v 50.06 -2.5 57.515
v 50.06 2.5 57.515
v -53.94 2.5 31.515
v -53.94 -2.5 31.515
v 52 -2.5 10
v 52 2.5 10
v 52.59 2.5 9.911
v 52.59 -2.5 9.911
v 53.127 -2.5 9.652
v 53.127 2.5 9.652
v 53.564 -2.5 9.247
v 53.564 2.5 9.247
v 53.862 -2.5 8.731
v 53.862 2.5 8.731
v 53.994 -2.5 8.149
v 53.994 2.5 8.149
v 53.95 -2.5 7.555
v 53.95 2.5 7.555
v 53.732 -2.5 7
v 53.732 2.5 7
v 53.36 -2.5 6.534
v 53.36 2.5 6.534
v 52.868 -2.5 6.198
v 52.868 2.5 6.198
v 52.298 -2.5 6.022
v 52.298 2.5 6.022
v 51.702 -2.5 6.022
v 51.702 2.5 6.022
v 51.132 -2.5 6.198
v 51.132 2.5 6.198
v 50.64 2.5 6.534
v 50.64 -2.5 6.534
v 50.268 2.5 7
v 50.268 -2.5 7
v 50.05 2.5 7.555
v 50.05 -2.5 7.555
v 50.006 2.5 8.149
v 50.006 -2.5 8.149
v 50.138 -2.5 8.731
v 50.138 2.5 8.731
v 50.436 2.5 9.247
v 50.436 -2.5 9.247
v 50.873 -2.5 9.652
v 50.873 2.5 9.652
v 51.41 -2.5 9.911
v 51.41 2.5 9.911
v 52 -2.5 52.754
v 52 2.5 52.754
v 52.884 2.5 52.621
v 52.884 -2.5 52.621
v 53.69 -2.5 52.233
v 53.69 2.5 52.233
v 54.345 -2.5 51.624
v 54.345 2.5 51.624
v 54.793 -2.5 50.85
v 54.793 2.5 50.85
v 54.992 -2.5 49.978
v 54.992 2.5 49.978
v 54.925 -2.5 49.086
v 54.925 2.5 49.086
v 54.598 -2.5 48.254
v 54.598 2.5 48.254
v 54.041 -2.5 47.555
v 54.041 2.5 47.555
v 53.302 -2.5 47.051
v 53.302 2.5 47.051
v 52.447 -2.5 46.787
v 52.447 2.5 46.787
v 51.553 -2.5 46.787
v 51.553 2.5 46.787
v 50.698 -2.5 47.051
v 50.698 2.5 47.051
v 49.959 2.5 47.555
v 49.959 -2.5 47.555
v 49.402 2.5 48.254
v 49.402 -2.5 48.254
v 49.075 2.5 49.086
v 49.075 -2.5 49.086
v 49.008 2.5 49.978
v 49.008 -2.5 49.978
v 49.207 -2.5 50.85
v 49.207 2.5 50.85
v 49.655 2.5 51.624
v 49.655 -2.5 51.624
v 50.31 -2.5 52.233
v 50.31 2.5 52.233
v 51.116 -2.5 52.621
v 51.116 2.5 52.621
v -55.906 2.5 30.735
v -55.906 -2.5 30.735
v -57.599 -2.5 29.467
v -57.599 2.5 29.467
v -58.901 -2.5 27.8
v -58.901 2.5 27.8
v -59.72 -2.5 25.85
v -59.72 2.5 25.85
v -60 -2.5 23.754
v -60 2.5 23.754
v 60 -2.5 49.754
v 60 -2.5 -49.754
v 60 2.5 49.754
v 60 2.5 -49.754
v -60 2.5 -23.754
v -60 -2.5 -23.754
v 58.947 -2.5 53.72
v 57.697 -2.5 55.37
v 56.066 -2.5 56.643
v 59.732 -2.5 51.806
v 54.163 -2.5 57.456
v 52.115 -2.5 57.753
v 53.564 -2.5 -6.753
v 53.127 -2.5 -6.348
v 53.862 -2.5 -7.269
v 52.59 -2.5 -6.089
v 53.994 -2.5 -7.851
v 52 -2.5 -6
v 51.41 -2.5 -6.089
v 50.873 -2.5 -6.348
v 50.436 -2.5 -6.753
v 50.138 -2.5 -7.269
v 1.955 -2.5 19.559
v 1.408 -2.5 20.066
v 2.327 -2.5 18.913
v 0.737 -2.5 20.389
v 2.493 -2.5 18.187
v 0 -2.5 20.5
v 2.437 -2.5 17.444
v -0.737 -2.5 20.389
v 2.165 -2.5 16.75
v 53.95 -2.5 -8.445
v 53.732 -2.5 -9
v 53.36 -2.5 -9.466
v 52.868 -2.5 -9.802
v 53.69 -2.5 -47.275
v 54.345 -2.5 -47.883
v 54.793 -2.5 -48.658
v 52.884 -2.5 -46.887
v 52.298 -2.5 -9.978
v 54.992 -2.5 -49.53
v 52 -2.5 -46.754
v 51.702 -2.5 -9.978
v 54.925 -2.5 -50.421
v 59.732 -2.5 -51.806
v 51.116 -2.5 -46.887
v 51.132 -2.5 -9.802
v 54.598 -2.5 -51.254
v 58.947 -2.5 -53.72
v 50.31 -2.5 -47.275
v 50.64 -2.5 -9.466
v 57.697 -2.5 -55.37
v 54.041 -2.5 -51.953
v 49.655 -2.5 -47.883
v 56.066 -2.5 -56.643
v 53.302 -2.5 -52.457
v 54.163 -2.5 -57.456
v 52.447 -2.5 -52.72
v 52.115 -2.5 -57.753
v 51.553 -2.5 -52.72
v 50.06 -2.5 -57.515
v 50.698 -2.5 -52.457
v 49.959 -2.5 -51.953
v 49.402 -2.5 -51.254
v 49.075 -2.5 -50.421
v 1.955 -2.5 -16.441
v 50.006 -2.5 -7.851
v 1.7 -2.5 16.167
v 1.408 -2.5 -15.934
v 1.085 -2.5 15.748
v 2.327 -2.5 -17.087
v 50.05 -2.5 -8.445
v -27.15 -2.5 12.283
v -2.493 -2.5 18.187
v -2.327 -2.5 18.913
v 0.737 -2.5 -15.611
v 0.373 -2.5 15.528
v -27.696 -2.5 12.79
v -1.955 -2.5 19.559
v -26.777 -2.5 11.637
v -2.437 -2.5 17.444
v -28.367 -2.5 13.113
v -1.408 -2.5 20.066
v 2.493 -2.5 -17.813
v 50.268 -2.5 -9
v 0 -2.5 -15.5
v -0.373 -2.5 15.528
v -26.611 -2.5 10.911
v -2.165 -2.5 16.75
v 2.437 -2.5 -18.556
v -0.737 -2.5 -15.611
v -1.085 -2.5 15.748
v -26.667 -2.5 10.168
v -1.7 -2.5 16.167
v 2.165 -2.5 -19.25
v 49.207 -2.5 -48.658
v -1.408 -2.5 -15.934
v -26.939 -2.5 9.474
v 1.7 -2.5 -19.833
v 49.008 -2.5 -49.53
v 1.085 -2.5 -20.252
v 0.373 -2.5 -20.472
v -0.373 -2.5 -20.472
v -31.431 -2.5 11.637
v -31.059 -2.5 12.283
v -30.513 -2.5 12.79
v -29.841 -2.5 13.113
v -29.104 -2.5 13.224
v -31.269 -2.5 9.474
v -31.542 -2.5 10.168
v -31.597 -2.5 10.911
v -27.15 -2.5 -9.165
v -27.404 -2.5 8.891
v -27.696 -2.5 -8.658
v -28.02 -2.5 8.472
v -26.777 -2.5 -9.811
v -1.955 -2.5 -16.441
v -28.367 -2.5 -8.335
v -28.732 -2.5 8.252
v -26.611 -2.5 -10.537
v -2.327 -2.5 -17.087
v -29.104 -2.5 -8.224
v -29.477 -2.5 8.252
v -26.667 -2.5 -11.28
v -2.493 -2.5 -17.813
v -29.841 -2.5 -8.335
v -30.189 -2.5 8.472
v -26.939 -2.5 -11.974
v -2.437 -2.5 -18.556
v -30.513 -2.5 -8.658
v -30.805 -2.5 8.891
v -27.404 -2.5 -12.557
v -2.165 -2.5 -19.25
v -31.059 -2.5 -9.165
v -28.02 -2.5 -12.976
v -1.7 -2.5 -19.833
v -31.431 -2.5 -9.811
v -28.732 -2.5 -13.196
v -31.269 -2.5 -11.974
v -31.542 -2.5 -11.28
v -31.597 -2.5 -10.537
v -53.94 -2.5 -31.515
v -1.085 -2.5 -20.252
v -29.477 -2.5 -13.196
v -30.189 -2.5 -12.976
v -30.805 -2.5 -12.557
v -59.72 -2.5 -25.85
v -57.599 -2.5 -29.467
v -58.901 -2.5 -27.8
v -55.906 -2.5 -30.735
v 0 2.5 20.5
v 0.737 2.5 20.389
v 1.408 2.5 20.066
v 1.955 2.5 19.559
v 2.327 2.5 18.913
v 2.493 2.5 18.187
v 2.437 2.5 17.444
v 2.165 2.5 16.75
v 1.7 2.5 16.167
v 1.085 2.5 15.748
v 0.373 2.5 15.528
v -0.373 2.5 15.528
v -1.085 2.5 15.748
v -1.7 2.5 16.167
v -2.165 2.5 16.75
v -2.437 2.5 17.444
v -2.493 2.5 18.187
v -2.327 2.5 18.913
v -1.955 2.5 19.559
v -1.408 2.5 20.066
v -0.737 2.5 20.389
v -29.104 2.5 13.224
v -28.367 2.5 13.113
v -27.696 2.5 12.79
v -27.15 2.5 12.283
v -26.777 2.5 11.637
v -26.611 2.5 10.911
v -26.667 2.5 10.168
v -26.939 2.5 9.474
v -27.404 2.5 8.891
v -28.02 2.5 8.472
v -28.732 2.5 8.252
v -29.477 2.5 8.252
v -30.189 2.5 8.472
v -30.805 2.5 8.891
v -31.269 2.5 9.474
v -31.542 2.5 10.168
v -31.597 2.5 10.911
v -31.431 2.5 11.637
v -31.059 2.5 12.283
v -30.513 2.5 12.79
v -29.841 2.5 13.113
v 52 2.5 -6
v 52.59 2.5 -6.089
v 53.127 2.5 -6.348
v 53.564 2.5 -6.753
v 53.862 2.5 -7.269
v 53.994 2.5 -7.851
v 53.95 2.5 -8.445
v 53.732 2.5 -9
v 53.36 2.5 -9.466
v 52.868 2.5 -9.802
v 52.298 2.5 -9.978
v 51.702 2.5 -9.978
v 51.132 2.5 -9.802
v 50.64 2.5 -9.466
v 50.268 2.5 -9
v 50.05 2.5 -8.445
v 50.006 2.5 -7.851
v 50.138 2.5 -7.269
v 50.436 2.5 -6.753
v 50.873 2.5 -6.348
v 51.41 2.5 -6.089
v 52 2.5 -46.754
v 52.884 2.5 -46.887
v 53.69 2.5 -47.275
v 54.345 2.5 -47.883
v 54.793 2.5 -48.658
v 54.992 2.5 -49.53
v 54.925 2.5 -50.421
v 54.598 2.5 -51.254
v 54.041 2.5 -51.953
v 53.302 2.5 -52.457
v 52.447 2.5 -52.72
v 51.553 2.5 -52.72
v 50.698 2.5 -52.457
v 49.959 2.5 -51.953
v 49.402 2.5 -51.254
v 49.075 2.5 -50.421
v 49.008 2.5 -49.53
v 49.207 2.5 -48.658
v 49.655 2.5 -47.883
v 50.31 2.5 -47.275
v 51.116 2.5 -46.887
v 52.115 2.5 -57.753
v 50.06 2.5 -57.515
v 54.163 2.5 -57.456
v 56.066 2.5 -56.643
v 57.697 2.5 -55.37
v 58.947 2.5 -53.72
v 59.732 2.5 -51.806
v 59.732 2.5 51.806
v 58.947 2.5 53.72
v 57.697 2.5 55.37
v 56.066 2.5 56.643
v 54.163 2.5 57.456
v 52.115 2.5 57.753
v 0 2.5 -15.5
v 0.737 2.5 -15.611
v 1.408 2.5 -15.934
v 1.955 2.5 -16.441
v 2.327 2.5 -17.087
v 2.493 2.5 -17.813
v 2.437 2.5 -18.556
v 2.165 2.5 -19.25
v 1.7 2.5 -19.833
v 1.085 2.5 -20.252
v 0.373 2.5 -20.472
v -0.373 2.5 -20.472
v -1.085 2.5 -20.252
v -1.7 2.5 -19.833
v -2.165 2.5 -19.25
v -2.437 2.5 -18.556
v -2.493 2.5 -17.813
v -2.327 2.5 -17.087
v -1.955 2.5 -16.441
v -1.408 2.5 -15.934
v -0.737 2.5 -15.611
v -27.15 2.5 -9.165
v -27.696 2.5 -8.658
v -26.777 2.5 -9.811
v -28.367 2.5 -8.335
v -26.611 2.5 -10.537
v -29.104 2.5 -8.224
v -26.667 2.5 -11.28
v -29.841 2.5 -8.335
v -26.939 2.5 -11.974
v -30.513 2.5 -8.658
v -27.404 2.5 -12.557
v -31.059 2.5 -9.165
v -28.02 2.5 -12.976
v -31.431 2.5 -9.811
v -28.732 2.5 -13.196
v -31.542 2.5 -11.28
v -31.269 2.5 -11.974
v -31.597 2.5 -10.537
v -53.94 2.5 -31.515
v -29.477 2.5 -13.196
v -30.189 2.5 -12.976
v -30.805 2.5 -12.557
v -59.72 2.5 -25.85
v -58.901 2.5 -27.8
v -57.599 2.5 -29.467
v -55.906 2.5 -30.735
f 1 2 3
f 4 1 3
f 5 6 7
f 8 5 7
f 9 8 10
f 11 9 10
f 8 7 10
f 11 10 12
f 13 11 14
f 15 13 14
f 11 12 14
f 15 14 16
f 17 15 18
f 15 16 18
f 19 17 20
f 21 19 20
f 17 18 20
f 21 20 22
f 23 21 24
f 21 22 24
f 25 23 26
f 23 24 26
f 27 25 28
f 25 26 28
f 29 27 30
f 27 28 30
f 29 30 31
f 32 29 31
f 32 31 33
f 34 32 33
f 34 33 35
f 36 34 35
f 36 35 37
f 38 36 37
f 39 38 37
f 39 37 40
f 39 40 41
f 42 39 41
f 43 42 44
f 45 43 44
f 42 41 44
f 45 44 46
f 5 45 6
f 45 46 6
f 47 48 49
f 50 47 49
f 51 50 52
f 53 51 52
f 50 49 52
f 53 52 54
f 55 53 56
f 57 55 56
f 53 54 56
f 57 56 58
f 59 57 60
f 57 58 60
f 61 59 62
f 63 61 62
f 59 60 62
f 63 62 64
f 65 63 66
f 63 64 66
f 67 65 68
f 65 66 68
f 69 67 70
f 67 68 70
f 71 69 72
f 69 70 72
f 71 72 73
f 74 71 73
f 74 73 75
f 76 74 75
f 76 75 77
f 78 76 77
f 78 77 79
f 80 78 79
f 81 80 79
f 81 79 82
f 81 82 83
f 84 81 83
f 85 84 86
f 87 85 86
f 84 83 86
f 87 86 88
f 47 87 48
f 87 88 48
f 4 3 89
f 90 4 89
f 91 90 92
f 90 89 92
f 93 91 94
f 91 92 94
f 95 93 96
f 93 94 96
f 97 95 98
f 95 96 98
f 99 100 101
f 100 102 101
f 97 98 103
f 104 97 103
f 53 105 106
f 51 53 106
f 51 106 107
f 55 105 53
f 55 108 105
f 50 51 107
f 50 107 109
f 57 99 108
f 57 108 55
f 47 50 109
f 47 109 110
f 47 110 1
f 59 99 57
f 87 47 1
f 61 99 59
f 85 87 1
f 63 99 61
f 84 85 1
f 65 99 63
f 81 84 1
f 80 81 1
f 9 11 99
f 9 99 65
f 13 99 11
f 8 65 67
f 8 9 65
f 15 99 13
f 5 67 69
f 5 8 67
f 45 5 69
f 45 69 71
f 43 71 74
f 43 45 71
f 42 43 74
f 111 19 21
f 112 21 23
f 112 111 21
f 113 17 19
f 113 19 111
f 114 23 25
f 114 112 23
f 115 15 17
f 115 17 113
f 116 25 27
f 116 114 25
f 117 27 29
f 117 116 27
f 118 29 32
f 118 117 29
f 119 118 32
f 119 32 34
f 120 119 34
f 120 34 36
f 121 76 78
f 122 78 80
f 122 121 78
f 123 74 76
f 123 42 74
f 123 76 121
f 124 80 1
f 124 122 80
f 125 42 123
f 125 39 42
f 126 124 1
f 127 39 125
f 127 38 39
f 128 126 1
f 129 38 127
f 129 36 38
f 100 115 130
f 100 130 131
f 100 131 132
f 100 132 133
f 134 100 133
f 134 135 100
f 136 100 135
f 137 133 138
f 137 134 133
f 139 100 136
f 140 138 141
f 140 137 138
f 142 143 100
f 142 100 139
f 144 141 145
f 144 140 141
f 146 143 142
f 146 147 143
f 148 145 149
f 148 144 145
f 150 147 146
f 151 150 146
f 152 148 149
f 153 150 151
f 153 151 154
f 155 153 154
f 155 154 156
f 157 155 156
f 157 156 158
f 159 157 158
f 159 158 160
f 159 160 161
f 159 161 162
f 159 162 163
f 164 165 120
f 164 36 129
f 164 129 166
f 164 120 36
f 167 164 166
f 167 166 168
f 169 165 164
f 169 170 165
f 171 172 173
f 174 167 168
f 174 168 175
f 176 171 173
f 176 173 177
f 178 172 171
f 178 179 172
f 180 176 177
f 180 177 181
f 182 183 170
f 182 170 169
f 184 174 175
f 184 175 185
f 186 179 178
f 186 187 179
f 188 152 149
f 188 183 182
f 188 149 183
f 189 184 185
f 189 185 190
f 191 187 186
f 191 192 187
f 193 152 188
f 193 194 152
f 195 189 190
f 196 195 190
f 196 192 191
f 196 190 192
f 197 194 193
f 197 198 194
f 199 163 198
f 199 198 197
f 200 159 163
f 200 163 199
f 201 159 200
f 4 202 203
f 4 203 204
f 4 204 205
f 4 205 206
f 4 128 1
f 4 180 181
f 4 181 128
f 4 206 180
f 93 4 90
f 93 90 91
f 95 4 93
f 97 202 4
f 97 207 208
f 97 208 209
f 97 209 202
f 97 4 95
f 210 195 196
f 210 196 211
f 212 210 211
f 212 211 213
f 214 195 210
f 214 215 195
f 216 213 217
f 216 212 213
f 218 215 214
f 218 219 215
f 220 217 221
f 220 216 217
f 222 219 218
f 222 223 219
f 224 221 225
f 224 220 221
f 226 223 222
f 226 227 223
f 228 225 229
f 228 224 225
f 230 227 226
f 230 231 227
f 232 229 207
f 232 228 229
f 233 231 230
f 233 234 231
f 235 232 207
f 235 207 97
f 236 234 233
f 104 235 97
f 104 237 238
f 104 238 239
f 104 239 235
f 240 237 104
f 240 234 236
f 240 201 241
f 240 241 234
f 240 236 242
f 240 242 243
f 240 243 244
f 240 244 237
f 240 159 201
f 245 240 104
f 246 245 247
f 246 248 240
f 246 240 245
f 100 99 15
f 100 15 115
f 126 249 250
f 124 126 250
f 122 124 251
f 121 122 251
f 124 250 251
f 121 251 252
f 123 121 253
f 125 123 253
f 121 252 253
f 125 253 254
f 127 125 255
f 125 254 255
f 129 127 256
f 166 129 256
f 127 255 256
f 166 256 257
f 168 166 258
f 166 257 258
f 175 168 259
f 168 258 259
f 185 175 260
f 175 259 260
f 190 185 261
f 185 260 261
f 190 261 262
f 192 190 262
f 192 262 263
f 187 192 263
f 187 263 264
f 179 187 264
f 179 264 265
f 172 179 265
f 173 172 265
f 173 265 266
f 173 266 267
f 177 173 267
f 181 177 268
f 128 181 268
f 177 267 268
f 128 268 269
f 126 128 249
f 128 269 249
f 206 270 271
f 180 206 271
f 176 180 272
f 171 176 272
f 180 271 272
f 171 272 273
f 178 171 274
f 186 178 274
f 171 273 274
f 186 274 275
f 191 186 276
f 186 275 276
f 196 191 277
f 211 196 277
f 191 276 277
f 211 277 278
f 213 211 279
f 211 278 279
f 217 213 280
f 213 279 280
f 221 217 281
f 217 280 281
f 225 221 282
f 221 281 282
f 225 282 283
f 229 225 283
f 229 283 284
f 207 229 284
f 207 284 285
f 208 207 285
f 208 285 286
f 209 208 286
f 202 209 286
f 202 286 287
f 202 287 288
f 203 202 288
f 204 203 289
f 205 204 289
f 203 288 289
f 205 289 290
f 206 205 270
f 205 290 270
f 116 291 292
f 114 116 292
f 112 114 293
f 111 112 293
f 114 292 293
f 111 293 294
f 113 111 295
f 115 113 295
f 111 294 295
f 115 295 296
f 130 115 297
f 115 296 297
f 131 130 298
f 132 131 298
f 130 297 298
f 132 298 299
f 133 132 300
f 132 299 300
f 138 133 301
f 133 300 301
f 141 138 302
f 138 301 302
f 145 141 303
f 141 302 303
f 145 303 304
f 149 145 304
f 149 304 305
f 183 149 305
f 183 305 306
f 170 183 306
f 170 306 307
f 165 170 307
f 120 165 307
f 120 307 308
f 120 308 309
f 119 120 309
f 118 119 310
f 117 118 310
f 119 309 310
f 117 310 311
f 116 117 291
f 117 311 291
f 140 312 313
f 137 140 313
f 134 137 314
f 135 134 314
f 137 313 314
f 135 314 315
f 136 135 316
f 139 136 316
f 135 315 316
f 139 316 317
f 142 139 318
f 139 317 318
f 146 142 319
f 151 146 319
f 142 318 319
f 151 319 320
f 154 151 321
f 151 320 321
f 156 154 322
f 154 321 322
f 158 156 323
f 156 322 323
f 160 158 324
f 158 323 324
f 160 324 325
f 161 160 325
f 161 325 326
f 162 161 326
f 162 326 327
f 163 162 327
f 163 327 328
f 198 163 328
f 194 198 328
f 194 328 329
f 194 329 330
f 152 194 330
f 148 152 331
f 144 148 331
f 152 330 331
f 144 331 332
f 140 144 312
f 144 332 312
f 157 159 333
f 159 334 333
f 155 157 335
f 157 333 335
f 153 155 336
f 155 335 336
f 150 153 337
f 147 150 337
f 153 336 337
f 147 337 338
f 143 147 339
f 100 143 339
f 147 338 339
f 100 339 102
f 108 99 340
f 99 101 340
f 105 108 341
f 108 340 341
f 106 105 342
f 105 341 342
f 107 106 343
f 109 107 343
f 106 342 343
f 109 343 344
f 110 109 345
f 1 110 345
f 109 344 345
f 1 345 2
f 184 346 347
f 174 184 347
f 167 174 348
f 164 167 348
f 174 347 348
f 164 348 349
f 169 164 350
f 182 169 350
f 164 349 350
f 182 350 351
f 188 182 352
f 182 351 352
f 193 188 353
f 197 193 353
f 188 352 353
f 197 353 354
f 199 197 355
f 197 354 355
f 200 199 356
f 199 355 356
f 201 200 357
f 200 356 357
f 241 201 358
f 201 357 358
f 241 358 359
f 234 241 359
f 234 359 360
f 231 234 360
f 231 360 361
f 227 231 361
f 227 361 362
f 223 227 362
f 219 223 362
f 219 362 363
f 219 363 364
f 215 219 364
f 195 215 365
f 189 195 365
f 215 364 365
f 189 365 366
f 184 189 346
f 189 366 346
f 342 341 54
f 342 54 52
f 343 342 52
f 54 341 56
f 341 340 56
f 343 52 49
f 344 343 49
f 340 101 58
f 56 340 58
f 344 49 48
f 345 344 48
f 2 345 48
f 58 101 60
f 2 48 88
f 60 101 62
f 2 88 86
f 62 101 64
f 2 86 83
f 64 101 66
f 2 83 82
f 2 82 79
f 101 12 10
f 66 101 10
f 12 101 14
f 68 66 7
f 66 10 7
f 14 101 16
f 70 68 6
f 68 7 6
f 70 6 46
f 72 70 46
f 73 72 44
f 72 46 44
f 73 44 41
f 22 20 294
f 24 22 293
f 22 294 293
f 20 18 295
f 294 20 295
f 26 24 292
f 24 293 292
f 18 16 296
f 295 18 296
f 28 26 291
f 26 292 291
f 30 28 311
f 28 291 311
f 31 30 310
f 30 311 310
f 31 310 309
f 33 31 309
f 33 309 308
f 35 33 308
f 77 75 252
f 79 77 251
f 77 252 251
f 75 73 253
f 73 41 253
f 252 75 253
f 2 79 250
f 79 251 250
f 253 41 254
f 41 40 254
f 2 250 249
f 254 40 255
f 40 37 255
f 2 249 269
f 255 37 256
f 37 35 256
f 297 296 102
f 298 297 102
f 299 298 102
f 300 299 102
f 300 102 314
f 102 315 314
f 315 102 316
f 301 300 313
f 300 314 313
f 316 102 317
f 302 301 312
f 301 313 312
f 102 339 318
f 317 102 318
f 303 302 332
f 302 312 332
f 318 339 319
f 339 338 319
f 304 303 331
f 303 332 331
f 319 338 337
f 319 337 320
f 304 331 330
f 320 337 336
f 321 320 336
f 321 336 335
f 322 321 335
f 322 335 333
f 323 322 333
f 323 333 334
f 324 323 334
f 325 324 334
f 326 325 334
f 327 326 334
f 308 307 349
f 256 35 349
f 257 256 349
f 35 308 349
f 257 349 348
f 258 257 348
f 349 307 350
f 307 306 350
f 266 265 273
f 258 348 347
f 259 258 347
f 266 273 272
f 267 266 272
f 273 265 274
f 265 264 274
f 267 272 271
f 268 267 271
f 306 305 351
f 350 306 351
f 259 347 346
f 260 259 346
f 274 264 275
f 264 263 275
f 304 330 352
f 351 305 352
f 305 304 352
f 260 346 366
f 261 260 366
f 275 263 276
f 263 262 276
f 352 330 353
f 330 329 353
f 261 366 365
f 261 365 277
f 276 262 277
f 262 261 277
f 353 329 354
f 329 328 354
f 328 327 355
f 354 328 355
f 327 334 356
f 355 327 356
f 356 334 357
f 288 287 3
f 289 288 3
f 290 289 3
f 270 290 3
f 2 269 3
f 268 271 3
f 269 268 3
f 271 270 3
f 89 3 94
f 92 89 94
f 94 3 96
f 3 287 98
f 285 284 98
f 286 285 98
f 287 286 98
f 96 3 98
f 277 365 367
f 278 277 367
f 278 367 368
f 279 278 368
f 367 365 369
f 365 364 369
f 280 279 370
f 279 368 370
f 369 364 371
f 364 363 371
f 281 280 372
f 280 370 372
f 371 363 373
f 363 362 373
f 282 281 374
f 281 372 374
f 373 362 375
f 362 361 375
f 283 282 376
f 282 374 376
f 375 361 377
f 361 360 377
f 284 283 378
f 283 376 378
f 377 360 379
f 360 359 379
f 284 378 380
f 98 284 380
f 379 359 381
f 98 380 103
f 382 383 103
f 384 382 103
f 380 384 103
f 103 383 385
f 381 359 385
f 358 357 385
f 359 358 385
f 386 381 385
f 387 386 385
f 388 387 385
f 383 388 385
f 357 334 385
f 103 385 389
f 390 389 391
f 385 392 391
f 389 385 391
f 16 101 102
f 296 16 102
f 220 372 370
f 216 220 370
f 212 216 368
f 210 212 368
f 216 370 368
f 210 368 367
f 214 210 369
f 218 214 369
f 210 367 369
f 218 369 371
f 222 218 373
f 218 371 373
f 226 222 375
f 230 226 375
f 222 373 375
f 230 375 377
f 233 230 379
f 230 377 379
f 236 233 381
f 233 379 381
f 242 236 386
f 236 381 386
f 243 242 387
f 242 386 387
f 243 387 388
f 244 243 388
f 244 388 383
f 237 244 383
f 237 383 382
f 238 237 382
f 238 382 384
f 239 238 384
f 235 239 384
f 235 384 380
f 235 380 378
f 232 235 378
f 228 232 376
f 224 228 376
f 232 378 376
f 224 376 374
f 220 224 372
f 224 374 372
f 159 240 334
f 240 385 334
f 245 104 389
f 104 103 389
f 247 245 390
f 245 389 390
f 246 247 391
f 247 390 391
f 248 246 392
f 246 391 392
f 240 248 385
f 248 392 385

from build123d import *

# Parameters (mm, degrees)
BOSS_EXTRUDE1_DEPTH = 2.5
SKETCH2_R           = 3
SKETCH2_R_2         = 2.5
SKETCH2_R_3         = 2
CUT_EXTRUDE1_DEPTH  = 5


with BuildPart() as part:
    # Sketch1 → Boss-Extrude1 (new, symmetric)
    with BuildSketch(Plane(origin=(0, 0, 0), x_dir=(1, 0, 0), z_dir=(0, 1, 0))):
        with BuildLine():
            Line((-60, -23.753788749), (-60, 23.753788749))
            ThreePointArc((-60, 23.753788749), (-58.305643504, 28.677086424), (-53.940285, 31.51492875))
            Line((-53.940285, 31.51492875), (50.059715, 57.51492875))
            ThreePointArc((50.059715, 57.51492875), (56.923297675, 56.059432253), (60, 49.753788749))
            Line((60, 49.753788749), (60, -49.753788749))
            ThreePointArc((60, -49.753788749), (56.923297675, -56.059432253), (50.059715, -57.51492875))
            Line((50.059715, -57.51492875), (-53.940285, -31.51492875))
            ThreePointArc((-53.940285, -31.51492875), (-58.305643504, -28.677086424), (-60, -23.753788749))
        make_face()
    extrude(amount=BOSS_EXTRUDE1_DEPTH, both=True)

    # Sketch2 → Cut-Extrude1 (cut)
    with BuildSketch(Plane(origin=(0, 2.5, 0), x_dir=(1, 0, 0), z_dir=(0, 1, 0))):
        with Locations(Location((52, 49.753788749, 0), (0, 0, 270))):
            Circle(SKETCH2_R)
        with Locations(Location((0, 18, 0), (0, 0, 270))):
            Circle(SKETCH2_R_2)
        with Locations(Location((52, -49.753788749, 0), (0, 0, 270))):
            Circle(SKETCH2_R)
        with Locations(Location((0, -18, 0), (0, 0, 270))):
            Circle(SKETCH2_R_2)
        with Locations(Location((-29.104275004, 10.723931249, 0), (0, 0, 270))):
            Circle(SKETCH2_R_2)
        with Locations(Location((-29.104275004, -10.723931249, 0), (0, 0, 270))):
            Circle(SKETCH2_R_2)
        with Locations(Location((52, 8, 0), (0, 0, 270))):
            Circle(SKETCH2_R_3)
        with Locations(Location((52, -8, 0), (0, 0, 270))):
            Circle(SKETCH2_R_3)
    extrude(amount=-CUT_EXTRUDE1_DEPTH, mode=Mode.SUBTRACT)


solid = part.part
